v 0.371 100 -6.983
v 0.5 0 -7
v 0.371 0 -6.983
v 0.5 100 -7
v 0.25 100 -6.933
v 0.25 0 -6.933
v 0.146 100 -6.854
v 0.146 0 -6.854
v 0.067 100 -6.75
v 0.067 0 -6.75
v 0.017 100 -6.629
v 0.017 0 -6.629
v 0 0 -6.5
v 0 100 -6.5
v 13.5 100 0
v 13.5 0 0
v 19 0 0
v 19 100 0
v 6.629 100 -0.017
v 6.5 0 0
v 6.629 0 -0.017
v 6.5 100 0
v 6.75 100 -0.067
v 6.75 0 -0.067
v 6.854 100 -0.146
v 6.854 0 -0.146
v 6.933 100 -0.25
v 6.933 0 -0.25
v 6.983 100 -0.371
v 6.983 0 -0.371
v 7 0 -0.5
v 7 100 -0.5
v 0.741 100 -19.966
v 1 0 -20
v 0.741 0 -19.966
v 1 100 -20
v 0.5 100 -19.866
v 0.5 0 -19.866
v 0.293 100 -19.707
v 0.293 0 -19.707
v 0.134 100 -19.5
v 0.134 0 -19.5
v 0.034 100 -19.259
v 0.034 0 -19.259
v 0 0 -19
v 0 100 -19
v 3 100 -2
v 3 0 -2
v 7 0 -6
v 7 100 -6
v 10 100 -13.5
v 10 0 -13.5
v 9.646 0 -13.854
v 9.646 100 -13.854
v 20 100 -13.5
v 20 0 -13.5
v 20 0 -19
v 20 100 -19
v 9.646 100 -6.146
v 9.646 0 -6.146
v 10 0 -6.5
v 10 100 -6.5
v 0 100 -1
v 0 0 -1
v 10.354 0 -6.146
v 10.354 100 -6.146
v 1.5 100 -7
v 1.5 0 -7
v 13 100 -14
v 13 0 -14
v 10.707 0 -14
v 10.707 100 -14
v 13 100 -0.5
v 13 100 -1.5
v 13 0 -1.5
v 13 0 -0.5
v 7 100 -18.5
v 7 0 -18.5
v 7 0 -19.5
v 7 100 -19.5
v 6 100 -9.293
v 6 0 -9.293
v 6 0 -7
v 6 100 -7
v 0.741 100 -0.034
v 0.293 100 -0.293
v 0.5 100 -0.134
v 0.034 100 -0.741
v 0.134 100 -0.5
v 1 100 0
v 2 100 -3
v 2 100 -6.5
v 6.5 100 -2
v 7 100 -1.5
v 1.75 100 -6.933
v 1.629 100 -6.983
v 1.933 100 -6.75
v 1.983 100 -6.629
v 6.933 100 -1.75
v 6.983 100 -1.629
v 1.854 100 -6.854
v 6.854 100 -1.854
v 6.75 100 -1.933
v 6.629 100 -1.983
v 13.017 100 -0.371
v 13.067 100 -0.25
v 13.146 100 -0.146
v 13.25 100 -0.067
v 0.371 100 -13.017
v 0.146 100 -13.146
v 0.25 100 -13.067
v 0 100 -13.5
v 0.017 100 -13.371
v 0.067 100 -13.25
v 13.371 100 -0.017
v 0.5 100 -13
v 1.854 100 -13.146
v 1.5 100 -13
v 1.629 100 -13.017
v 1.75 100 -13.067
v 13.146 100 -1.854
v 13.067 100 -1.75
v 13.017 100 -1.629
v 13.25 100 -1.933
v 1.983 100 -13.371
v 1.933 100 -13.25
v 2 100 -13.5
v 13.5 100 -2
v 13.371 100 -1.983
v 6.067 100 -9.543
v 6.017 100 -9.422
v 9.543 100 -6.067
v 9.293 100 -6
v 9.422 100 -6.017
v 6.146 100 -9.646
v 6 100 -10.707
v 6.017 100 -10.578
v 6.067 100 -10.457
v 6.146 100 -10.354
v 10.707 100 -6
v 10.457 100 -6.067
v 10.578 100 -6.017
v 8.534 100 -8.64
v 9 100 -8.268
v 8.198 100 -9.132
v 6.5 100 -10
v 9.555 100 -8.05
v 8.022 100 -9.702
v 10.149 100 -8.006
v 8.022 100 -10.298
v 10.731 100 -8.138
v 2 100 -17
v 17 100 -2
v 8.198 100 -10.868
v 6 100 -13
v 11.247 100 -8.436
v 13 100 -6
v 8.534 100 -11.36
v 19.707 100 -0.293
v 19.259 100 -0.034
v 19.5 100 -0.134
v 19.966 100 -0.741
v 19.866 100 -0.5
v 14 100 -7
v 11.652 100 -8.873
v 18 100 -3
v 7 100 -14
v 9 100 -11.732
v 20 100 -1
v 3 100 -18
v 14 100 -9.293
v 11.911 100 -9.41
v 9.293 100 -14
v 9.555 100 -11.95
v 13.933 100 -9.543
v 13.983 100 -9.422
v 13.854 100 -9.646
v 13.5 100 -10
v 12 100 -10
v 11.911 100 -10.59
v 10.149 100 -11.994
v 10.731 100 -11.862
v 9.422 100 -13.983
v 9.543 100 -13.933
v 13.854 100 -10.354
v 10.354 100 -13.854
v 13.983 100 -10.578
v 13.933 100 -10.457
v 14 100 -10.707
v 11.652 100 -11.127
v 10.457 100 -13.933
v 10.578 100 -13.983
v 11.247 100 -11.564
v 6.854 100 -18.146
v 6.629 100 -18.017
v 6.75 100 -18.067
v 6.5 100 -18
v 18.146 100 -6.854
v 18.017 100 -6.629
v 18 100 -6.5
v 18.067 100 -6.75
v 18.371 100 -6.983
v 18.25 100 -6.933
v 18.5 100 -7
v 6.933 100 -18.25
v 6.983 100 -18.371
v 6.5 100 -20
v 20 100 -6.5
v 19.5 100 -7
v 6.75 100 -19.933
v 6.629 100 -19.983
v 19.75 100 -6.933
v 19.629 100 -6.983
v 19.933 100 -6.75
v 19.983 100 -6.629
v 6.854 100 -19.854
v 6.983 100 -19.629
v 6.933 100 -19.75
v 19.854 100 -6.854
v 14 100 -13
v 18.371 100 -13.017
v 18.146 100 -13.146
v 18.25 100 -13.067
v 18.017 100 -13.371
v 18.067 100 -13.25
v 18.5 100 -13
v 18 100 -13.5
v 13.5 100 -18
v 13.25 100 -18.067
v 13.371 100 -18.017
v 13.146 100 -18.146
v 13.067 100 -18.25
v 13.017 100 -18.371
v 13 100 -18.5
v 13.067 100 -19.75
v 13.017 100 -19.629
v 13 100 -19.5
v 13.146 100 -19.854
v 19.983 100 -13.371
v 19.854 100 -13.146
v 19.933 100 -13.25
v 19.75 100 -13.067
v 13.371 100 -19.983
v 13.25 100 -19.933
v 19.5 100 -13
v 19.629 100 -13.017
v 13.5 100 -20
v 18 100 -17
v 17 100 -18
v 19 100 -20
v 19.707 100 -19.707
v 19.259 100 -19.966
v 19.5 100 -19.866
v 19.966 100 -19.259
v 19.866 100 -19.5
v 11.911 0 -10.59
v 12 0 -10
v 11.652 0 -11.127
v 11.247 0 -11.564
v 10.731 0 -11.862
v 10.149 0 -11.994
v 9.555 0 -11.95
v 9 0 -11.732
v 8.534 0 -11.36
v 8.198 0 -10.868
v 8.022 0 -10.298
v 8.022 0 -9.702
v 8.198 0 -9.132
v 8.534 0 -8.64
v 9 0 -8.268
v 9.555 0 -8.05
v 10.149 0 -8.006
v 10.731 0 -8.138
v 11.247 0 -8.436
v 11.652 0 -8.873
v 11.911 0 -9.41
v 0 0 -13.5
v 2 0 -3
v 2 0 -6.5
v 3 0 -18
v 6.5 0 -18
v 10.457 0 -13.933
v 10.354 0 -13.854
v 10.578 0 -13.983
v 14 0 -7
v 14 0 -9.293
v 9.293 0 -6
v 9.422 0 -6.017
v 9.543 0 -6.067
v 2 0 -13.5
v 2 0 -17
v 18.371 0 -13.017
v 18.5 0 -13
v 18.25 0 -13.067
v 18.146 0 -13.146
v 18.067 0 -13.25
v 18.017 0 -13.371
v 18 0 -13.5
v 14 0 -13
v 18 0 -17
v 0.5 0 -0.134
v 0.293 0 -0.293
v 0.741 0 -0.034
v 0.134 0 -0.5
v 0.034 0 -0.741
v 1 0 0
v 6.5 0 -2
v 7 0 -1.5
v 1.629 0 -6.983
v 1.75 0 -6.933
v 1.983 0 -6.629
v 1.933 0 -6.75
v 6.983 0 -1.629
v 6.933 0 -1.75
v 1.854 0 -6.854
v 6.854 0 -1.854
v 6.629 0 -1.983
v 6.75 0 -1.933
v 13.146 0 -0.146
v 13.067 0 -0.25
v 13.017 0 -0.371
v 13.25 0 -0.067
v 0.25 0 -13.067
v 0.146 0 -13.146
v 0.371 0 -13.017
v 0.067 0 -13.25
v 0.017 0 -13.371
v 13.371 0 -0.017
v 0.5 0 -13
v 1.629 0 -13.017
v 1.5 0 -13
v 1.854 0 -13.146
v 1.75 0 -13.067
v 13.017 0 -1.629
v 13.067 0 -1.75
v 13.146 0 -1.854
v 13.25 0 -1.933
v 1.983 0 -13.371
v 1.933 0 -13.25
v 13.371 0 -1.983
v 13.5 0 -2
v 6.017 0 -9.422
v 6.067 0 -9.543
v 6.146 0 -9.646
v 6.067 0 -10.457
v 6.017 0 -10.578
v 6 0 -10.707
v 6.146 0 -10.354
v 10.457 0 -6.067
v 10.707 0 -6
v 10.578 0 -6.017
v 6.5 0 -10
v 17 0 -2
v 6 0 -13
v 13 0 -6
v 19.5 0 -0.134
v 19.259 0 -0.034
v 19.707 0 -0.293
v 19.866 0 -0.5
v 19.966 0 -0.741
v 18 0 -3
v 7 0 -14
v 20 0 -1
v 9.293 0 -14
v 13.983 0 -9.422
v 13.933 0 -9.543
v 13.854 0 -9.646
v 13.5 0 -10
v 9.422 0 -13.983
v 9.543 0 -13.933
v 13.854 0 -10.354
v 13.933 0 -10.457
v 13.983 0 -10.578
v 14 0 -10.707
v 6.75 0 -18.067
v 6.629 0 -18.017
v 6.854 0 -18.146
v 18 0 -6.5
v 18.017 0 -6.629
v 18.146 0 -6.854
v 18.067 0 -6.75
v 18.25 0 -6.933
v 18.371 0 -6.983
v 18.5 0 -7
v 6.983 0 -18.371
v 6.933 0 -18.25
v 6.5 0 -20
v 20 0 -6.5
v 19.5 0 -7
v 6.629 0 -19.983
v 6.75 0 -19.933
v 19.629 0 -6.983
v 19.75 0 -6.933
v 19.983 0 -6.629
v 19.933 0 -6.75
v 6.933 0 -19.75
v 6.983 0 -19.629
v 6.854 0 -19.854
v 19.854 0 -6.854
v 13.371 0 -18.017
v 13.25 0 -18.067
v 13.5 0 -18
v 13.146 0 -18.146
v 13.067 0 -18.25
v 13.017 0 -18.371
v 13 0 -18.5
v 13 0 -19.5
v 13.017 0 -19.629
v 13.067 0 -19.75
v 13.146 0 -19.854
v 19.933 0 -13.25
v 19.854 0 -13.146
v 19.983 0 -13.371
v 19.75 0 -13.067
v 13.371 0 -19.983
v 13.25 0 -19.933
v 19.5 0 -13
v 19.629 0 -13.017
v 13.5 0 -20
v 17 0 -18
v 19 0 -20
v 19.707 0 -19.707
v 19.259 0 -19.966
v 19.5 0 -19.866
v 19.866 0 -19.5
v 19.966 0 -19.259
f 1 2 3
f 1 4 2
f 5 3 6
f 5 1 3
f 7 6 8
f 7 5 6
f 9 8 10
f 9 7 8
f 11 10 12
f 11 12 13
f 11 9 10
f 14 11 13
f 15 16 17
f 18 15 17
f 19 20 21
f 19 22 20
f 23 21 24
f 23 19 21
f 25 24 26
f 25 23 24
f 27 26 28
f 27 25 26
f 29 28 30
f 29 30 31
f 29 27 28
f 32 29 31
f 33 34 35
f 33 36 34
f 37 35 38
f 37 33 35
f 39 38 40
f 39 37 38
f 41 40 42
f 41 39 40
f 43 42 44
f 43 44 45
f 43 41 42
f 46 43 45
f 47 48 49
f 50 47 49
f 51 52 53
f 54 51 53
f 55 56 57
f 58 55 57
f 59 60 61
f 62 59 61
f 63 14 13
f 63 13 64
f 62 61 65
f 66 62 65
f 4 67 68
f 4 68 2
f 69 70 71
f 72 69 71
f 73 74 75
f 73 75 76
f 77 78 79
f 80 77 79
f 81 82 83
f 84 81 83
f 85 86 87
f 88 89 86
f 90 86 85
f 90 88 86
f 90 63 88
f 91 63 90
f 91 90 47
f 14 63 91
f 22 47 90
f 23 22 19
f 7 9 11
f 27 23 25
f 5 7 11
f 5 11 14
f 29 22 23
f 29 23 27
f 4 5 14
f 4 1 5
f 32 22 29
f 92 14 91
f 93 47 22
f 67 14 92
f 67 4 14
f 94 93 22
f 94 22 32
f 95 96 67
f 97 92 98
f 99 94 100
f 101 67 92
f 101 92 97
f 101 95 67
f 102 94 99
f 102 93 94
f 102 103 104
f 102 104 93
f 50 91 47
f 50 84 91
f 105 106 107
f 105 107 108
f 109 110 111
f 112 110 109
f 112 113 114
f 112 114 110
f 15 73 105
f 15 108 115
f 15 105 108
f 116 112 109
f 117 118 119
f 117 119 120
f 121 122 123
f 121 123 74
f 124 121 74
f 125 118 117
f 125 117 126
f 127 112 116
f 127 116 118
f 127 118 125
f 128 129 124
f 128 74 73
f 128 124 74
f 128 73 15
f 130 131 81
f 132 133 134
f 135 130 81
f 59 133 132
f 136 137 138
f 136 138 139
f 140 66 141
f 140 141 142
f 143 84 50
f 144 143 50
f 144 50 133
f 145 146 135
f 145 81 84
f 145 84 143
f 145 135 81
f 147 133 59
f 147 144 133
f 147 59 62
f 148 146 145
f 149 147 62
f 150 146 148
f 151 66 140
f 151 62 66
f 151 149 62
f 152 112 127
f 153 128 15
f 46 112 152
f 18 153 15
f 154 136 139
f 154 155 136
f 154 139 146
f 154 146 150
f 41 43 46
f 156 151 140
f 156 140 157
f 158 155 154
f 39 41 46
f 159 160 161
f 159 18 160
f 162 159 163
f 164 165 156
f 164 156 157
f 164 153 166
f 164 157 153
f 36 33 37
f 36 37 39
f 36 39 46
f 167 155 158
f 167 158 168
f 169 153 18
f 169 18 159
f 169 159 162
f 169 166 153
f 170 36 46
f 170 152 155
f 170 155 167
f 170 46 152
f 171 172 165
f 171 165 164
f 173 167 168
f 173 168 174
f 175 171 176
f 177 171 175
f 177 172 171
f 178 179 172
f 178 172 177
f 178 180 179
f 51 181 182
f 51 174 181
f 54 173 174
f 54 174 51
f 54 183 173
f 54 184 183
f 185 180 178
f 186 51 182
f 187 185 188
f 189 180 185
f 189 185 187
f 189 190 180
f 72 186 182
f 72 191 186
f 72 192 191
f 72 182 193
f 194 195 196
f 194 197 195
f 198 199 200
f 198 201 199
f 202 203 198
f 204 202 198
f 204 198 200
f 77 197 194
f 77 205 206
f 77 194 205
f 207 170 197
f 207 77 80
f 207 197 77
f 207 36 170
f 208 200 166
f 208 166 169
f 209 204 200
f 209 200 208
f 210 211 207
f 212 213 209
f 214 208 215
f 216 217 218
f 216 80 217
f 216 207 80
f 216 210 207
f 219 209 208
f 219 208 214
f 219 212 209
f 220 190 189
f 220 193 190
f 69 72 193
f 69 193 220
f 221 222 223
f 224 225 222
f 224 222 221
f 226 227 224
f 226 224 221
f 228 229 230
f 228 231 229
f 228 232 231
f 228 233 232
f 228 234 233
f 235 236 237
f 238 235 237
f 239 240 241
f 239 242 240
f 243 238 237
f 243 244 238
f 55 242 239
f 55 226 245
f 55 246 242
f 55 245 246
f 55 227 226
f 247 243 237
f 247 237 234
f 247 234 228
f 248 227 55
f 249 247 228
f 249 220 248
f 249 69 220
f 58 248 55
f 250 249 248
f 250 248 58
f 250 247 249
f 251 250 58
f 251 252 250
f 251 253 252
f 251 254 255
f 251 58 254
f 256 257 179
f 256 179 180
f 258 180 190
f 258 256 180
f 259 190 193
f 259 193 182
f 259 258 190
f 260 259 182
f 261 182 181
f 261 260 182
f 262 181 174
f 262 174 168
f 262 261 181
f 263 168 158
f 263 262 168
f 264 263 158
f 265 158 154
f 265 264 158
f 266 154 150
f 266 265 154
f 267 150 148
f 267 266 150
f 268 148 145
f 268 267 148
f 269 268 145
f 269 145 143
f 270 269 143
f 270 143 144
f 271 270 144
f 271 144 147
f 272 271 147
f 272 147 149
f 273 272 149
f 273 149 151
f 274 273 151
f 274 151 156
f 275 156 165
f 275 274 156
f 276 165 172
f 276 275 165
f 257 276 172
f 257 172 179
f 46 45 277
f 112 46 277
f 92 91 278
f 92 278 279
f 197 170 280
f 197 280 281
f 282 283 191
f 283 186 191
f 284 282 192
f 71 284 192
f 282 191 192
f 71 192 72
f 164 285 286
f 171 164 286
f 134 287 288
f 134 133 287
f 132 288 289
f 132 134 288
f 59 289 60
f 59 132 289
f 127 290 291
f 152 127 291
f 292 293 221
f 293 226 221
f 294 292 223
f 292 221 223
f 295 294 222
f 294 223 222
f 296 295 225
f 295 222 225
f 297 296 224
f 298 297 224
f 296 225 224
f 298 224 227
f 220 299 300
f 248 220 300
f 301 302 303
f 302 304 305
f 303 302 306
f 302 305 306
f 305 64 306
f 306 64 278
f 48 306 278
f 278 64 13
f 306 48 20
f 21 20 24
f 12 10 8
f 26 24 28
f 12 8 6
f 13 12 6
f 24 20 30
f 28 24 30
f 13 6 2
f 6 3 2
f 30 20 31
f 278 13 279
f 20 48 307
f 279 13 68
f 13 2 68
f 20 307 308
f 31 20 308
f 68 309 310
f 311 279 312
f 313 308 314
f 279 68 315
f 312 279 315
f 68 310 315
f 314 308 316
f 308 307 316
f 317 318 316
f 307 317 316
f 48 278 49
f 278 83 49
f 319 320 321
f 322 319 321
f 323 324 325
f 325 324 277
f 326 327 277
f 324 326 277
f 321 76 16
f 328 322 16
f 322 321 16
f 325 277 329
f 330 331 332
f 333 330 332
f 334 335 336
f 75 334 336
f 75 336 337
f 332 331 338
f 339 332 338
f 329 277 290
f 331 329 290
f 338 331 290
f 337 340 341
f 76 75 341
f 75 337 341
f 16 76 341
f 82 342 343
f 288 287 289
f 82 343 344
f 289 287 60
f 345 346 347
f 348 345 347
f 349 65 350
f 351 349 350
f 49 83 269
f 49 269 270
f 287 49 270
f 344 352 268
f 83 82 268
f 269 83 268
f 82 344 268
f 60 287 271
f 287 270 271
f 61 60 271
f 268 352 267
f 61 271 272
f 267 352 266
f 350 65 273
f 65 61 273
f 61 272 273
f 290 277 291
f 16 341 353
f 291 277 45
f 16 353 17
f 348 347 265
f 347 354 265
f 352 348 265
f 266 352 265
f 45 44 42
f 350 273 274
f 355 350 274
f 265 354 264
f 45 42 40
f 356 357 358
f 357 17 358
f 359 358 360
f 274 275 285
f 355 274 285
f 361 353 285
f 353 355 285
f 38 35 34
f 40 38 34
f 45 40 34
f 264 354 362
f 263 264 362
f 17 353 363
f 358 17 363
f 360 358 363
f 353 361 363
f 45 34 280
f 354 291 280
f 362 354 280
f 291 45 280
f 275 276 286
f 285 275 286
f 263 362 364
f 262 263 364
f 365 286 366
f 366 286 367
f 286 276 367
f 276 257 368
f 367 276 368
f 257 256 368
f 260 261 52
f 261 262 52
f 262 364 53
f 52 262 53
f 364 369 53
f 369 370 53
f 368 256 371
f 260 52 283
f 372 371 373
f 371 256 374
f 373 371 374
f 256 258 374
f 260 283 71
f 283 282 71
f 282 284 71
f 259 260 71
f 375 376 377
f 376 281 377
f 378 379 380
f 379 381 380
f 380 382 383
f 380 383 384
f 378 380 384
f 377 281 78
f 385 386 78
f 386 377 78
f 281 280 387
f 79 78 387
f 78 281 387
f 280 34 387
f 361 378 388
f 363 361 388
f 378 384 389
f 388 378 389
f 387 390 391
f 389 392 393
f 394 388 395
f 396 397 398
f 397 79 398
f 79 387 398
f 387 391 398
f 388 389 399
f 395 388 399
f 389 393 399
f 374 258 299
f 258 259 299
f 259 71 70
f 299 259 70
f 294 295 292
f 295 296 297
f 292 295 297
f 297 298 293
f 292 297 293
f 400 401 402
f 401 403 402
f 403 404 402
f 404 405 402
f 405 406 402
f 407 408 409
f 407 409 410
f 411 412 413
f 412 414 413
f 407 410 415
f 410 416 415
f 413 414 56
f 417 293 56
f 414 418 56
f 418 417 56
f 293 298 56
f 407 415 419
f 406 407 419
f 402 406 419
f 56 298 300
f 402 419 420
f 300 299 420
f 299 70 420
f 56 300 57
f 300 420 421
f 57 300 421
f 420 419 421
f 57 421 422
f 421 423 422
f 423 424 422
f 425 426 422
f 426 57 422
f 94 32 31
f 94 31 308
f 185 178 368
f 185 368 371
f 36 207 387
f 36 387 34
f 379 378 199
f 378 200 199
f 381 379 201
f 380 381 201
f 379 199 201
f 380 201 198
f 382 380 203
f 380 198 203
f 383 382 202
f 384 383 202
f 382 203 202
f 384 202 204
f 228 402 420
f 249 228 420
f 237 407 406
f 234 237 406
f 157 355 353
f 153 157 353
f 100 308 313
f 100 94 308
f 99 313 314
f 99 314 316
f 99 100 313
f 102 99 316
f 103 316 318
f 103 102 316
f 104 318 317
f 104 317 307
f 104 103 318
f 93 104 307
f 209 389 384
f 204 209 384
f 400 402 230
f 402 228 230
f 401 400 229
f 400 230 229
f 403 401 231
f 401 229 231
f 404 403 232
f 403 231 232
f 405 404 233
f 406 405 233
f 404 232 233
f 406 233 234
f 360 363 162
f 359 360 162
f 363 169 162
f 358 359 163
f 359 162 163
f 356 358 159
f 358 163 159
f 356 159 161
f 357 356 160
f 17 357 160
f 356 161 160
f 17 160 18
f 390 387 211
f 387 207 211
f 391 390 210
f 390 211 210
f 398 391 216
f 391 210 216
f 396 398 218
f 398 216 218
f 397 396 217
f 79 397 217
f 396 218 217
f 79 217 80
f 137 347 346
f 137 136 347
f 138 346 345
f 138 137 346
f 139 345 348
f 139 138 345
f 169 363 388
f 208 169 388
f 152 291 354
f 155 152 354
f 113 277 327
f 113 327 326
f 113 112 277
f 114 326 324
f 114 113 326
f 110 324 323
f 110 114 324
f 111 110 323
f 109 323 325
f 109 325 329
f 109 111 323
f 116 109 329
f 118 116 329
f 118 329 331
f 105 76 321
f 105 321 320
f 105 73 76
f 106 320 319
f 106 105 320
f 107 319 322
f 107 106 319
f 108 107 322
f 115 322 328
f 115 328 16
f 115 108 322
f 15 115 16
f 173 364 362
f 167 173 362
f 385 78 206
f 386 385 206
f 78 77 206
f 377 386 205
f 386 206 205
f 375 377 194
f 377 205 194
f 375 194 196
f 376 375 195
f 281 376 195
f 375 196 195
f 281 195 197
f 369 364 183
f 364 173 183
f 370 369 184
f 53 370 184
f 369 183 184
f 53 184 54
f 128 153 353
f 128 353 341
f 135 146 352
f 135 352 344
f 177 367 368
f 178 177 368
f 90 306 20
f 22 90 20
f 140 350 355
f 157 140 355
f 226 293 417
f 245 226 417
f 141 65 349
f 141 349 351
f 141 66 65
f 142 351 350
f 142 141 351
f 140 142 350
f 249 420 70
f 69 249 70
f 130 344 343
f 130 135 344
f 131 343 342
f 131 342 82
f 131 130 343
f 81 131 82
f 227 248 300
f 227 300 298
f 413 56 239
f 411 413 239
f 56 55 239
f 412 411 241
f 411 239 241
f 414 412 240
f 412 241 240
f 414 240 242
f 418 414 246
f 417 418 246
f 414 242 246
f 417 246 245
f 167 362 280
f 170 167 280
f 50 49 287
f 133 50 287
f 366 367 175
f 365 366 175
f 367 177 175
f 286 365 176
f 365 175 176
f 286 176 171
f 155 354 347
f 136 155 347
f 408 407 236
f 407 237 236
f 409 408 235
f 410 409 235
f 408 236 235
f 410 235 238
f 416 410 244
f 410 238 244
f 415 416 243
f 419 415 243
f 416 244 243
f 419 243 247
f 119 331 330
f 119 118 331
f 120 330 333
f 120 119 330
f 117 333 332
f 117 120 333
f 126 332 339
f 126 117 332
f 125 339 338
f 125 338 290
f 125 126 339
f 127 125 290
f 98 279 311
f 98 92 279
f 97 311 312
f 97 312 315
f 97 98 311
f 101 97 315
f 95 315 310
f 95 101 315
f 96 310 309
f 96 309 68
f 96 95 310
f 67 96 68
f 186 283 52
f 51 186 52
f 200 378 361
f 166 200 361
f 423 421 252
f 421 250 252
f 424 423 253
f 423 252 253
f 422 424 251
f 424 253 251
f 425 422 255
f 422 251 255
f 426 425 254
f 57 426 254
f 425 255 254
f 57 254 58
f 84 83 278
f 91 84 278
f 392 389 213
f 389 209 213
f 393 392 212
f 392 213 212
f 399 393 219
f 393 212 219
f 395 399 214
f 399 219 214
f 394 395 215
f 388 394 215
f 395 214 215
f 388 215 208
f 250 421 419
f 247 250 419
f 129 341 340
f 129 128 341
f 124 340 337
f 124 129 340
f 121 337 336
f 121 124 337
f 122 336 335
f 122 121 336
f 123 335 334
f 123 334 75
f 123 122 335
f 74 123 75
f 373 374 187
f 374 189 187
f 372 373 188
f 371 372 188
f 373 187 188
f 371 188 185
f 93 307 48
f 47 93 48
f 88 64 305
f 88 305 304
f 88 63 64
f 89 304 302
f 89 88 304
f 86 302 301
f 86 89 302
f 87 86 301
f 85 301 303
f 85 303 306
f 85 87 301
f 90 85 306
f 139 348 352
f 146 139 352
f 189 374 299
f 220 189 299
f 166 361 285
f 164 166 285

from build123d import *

# Parameters (mm, degrees)
SKETCH1_R           = 2
BOSS_EXTRUDE1_DEPTH = 100
FILLET1_R           = 1
FILLET2_R           = 0.5
FILLET4_R           = 0.5


with BuildPart() as part:
    # Sketch1 → Boss-Extrude1 (new body)
    with BuildSketch(Plane(origin=(0, 0, 0), x_dir=(1, 0, 0), z_dir=(0, 1, 0))):
        Polygon((7, 18), (7, 20), (0, 20), (0, 13), (2, 13), (2, 17), (6, 13), (6, 10.5), (6.5, 10), (6, 9.5), (6, 7), (2, 3), (2, 7), (0, 7), (0, 0), (7, 0), (7, 2), (3, 2), (7, 6), (9.5, 6), (10, 6.5), (10.5, 6), (13, 6), (17, 2), (13, 2), (13, 0), (20, 0), (20, 7), (18, 7), (18, 3), (14, 7), (14, 9.5), (13.5, 10), (14, 10.5), (14, 13), (18, 17), (18, 13), (20, 13), (20, 20), (13, 20), (13, 18), (17, 18), (13, 14), (10.5, 14), (10, 13.5), (9.5, 14), (7, 14), (3, 18), align=None)
        with Locations((10, 10)):
            Circle(SKETCH1_R, mode=Mode.SUBTRACT)
    extrude(amount=BOSS_EXTRUDE1_DEPTH)

    # Fillet1
    fillet1_edges = [part.edges().sort_by_distance(p)[0] for p in [
        (0, 50, -20),
        (20, 50, -20),
        (20, 50, 0),
        (0, 50, 0),
    ]]
    fillet(fillet1_edges, radius=FILLET1_R)

    # Fillet2
    fillet2_edges = [part.edges().sort_by_distance(p)[0] for p in [
        (2, 50, -13),
        (0, 50, -13),
        (7, 50, -20),
        (7, 50, -18),
        (13, 50, -18),
        (13, 50, -20),
        (20, 50, -13),
        (18, 50, -13),
        (18, 50, -7),
        (20, 50, -7),
        (13, 50, 0),
        (13, 50, -2),
        (7, 50, -2),
        (7, 50, 0),
        (0, 50, -7),
        (2, 50, -7),
    ]]
    fillet(fillet2_edges, radius=FILLET2_R)

    # Fillet4
    fillet4_edges = [part.edges().sort_by_distance(p)[0] for p in [
        (9.5, 50, -14),
        (10.5, 50, -14),
        (14, 50, -10.5),
        (14, 50, -9.5),
        (10.5, 50, -6),
        (9.5, 50, -6),
        (6, 50, -9.5),
        (6, 50, -10.5),
    ]]
    fillet(fillet4_edges, radius=FILLET4_R)


solid = part.part
